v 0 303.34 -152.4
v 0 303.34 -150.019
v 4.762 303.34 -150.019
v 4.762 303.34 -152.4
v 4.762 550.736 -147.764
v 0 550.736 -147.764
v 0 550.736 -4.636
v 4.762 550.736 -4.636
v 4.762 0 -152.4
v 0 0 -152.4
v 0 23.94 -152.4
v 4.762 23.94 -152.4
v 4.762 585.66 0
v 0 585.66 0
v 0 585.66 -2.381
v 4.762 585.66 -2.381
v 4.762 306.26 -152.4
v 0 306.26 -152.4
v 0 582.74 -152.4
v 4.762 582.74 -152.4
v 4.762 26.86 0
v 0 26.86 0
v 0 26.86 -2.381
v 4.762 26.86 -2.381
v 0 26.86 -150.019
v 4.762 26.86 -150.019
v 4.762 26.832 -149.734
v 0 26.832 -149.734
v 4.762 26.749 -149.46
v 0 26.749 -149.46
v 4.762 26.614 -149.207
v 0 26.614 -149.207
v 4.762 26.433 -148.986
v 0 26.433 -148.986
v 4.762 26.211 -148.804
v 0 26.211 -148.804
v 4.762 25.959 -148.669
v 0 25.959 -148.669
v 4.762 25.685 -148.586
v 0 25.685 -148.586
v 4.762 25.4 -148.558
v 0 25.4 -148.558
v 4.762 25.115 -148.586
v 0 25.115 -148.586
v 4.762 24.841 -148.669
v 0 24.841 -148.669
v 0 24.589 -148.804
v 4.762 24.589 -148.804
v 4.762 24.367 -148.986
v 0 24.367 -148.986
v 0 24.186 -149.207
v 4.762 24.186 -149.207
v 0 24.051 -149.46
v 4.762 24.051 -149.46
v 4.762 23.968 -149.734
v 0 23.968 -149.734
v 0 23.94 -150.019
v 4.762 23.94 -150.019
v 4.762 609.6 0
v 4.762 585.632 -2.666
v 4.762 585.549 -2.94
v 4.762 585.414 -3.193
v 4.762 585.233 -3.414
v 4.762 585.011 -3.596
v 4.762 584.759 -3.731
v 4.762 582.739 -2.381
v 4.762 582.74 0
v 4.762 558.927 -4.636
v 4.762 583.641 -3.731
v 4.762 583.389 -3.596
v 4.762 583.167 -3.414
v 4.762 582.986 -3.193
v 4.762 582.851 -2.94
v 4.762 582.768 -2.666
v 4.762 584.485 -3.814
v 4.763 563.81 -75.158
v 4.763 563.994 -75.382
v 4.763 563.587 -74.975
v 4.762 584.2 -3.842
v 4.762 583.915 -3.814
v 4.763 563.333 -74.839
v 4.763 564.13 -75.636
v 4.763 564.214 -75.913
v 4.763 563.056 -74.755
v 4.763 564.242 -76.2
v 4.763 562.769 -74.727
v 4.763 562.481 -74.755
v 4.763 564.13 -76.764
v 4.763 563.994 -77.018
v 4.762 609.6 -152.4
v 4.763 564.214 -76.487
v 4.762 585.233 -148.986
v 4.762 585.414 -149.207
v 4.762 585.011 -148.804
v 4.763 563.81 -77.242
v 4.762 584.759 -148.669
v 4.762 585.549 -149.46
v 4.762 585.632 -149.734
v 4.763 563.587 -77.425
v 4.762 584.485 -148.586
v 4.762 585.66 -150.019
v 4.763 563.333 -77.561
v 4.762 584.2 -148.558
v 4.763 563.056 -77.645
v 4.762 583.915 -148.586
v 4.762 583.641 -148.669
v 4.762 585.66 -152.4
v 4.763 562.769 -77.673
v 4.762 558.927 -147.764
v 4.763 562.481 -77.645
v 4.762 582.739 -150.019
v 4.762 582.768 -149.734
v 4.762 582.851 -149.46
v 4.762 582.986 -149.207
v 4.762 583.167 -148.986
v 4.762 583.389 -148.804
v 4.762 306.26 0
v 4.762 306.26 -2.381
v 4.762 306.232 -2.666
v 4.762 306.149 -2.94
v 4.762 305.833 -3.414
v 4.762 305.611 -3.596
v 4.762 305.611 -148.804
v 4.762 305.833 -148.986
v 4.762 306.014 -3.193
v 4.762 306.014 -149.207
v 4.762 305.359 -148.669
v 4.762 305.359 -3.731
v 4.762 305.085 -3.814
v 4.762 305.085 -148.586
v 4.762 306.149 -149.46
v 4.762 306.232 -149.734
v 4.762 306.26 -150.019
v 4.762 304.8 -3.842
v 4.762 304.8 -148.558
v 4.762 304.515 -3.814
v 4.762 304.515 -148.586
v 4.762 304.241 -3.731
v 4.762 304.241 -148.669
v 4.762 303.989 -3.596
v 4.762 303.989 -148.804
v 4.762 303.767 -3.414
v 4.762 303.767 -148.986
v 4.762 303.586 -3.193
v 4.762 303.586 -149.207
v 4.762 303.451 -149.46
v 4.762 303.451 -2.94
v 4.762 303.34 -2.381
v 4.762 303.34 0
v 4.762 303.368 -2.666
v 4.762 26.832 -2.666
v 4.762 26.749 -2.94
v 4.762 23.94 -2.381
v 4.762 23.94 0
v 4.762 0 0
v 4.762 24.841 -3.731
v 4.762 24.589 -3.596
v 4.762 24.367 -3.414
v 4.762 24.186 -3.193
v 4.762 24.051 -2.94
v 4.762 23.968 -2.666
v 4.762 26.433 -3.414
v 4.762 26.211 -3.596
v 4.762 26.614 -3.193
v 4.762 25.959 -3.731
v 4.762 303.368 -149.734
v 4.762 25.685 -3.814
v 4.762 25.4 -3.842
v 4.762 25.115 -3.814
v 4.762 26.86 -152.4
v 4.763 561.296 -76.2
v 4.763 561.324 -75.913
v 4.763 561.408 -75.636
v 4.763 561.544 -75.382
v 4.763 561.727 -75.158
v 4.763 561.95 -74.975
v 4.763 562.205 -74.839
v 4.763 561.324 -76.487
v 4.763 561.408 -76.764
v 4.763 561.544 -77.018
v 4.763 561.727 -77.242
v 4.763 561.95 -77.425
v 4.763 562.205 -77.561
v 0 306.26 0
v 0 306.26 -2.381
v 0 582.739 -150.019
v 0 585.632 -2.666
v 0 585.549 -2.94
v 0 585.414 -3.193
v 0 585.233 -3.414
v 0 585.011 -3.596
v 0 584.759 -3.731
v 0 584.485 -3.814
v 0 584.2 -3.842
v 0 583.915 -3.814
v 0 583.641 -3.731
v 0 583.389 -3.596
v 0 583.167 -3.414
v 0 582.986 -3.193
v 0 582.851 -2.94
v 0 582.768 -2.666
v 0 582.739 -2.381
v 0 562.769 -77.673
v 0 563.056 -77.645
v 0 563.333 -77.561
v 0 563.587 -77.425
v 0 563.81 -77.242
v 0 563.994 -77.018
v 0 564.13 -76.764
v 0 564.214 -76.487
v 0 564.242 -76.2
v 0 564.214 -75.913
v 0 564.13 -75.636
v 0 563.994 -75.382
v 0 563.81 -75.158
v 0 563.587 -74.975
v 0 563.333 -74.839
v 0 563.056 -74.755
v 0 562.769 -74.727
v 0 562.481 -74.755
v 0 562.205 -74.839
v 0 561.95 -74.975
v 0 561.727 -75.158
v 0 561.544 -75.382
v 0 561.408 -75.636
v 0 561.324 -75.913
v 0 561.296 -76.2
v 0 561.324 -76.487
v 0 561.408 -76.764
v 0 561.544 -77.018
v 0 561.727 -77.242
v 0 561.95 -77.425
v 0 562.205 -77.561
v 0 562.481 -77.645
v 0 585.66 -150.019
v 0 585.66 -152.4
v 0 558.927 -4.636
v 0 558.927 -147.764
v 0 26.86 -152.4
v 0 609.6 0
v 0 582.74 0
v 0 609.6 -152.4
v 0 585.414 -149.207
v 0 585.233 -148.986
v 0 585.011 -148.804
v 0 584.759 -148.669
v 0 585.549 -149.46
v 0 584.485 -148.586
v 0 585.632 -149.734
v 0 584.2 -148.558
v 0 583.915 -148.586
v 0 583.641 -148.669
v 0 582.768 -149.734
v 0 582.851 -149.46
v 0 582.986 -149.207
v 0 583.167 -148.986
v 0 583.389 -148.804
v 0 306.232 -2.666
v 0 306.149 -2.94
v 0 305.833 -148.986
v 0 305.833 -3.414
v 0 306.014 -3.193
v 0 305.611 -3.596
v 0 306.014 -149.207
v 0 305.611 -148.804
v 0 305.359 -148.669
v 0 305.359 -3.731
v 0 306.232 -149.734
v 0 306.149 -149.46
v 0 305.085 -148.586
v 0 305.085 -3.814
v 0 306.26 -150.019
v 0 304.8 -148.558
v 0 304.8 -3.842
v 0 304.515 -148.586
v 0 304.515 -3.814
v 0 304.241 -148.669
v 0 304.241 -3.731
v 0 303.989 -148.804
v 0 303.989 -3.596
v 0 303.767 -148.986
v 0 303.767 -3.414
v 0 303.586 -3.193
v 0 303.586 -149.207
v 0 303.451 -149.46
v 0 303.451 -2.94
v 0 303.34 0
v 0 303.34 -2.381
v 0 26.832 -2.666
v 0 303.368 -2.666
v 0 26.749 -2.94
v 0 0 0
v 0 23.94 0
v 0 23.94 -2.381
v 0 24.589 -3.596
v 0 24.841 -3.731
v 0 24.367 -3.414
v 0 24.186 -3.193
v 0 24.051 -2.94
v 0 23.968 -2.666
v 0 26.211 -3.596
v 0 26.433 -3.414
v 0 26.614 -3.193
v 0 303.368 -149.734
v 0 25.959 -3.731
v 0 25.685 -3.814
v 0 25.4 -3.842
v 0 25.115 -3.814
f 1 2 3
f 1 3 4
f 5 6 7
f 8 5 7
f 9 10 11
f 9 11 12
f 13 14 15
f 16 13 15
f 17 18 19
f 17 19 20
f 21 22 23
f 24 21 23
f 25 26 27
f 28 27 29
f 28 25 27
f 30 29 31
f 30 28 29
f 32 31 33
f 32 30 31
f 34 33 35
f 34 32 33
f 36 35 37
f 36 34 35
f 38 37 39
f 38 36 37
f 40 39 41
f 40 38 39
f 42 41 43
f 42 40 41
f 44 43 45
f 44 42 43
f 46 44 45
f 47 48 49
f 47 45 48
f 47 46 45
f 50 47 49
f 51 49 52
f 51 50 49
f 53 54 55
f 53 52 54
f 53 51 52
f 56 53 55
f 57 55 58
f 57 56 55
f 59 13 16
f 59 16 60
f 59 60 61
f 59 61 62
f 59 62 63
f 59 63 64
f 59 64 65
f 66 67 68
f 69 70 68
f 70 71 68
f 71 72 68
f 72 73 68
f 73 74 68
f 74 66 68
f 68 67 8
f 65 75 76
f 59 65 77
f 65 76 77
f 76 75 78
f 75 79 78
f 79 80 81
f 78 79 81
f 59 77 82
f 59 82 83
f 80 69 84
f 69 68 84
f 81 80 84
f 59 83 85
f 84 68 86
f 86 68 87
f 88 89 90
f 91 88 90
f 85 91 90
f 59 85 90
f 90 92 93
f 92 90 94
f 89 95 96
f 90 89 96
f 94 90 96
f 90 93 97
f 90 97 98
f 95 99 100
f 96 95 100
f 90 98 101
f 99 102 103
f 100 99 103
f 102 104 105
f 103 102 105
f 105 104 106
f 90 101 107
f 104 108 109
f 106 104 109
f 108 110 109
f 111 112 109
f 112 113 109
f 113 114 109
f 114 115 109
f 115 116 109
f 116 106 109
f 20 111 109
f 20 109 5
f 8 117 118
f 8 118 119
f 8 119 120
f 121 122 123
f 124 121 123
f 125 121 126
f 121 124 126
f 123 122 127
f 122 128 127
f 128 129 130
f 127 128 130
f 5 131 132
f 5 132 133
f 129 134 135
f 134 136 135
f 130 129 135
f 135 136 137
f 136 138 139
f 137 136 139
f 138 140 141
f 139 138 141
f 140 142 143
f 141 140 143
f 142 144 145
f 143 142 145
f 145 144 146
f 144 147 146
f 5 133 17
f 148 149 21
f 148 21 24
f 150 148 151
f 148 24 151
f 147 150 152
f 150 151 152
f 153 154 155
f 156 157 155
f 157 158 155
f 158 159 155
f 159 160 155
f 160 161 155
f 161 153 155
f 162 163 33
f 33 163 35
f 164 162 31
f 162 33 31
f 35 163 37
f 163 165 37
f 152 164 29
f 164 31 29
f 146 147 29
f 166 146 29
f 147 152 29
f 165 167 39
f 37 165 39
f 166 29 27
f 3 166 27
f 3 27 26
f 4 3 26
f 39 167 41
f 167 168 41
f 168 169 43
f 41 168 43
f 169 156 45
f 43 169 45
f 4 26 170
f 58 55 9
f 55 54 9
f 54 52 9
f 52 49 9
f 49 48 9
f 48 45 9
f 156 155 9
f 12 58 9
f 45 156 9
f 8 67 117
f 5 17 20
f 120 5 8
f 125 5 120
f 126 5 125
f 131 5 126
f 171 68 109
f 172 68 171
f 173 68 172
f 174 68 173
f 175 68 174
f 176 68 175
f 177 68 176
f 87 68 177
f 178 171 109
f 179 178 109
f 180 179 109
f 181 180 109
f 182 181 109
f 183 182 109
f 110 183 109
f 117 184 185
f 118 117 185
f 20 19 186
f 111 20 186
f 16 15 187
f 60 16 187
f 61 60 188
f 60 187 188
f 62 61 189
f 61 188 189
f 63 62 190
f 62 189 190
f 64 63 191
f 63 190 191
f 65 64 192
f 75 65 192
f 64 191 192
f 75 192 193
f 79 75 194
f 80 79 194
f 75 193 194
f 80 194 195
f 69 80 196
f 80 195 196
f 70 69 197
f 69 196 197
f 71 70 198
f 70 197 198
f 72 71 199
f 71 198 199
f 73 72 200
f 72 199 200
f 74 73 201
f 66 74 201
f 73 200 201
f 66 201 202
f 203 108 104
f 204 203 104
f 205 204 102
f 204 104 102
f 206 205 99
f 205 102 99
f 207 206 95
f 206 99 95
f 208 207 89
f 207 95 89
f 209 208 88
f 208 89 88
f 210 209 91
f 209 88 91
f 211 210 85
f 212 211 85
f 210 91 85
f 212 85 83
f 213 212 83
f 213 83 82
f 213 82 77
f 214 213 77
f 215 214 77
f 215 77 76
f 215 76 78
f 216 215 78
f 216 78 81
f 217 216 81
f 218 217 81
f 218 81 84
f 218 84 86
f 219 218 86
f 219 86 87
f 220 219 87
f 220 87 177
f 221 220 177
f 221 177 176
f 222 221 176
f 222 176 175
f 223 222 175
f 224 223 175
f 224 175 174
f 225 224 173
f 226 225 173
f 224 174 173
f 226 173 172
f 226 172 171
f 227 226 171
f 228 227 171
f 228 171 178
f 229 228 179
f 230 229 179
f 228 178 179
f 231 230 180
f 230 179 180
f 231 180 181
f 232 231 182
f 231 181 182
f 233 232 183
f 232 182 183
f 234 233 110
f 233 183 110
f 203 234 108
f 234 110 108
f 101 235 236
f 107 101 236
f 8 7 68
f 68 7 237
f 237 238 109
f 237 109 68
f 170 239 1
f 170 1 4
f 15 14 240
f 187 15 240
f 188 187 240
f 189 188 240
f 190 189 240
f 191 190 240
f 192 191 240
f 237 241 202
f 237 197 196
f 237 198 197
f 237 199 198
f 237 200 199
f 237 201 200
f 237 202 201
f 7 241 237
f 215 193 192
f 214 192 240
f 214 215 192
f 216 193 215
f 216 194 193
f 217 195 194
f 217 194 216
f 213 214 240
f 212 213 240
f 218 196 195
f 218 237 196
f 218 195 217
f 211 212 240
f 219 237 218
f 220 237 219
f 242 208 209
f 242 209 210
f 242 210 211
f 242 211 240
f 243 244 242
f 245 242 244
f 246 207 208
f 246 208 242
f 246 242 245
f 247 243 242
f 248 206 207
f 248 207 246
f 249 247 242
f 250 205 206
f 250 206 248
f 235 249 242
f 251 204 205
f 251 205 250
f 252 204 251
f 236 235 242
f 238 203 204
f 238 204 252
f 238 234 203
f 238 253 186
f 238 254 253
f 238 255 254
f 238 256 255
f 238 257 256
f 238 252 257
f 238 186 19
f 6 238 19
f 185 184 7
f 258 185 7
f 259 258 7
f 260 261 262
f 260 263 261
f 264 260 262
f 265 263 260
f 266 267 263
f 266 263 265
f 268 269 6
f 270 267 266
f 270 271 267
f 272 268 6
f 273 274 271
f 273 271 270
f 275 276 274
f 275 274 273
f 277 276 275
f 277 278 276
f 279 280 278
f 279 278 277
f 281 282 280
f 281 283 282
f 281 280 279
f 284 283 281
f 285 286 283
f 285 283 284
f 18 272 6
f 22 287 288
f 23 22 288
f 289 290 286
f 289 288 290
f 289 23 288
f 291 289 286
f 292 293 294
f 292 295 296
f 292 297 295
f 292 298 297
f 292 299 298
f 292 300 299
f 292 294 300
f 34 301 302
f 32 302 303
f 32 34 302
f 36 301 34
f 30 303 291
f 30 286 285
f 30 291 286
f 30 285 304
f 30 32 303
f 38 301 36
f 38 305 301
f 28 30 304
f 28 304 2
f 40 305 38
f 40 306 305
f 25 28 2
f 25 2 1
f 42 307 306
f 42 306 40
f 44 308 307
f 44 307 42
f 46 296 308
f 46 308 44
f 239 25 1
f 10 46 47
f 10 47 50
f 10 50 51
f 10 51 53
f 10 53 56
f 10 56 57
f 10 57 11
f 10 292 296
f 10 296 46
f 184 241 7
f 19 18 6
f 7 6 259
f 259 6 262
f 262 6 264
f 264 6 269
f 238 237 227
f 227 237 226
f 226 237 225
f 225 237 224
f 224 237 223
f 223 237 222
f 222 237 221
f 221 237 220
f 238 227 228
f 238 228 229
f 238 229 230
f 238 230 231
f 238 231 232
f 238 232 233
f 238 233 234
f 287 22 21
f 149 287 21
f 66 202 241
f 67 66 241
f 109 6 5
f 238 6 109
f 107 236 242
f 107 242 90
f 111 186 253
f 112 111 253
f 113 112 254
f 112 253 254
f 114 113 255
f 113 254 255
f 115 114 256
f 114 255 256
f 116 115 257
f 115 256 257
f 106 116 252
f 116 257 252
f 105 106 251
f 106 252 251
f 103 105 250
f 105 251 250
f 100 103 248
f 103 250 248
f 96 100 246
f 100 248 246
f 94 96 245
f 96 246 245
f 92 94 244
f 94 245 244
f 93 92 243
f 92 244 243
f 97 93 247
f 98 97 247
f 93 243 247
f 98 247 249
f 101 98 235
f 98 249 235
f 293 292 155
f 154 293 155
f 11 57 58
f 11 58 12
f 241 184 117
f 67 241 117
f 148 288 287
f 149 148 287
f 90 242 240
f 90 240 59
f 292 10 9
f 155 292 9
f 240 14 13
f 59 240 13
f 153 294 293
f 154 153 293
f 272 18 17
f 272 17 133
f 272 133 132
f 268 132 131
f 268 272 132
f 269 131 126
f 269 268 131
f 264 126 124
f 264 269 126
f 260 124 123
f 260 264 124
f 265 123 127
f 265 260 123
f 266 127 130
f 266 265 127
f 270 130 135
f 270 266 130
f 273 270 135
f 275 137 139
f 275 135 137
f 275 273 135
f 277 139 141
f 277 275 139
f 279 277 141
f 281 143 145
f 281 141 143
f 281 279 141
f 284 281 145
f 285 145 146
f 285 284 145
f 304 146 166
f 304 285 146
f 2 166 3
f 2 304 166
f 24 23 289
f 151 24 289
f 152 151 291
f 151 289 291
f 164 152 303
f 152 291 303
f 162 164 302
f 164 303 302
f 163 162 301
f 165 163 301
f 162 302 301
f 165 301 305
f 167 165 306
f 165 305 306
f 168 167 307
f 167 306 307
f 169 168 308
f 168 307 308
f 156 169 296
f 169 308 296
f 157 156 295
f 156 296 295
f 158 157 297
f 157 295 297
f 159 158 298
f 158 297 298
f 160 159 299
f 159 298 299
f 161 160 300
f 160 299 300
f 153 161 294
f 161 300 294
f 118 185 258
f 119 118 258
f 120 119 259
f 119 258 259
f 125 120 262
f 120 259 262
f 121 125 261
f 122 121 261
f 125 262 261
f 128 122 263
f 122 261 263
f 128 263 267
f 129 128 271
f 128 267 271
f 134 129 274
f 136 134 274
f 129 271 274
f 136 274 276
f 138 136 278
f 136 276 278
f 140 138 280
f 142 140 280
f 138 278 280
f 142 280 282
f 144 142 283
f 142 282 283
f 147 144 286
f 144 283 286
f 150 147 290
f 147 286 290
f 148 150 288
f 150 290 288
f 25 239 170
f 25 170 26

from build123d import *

# Parameters (mm, degrees)
SKETCH1_W             = 4.7625
SKETCH1_H             = 152.4
BOSS_EXTRUDE1_DEPTH   = 609.6
SKETCH2_W             = 142.875
SKETCH2_H             = 7.9375
CUT_EXTRUDE1_DEPTH    = 629.379345146
CUT_EXTRUDE2_DEPTH    = 629.379345146
F_4_CLEARANCE_HOLE1_D = 2.9464
SKETCH6_W             = 143.129
SKETCH6_H             = 8.1915
SKETCH6_W_2           = 142.875
SKETCH6_H_2           = 7.9375
CUT_EXTRUDE3_DEPTH    = 629.379345146


with BuildPart() as part:
    # Sketch1 → Boss-Extrude1 (new body)
    with BuildSketch(Plane(origin=(0, 0, 0), x_dir=(1, 0, 0), z_dir=(0, 1, 0))):
        with Locations((2.38125, 76.2)):
            Rectangle(SKETCH1_W, SKETCH1_H)
    extrude(amount=BOSS_EXTRUDE1_DEPTH)

    # Sketch2 → Cut-Extrude1 (cut, through all)
    with BuildSketch(Plane(origin=(4.7625, 0, 0), x_dir=(0, 0, -1), z_dir=(1, 0, 0))):
        with Locations((76.2, 554.83125)):
            Rectangle(SKETCH2_W, SKETCH2_H)
    extrude(amount=-CUT_EXTRUDE1_DEPTH, mode=Mode.SUBTRACT)

    # Sketch3 → Cut-Extrude2 (cut, through all)
    with BuildSketch(Plane.ZY):
        with BuildLine():
            Line((-2.38125, 582.7395), (0, 582.7395))
            Line((0, 582.7395), (0, 585.6605))
            Line((0, 585.6605), (-2.38125, 585.6605))
            ThreePointArc((-2.38125, 585.6605), (-3.84175, 584.2), (-2.38125, 582.7395))
        make_face()
        with BuildLine():
            Line((-150.01875, 585.6605), (-152.4, 585.6605))
            Line((-152.4, 585.6605), (-152.4, 582.7395))
            Line((-152.4, 582.7395), (-150.01875, 582.7395))
            ThreePointArc((-150.01875, 582.7395), (-148.55825, 584.2), (-150.01875, 585.6605))
        make_face()
        with BuildLine():
            Line((-150.01875, 303.3395), (-152.4, 303.3395))
            Line((-152.4, 303.3395), (-152.4, 306.2605))
            Line((-152.4, 306.2605), (-150.01875, 306.2605))
            ThreePointArc((-150.01875, 306.2605), (-148.55825, 304.8), (-150.01875, 303.3395))
        make_face()
        with BuildLine():
            Line((-2.38125, 303.3395), (0, 303.3395))
            Line((0, 303.3395), (0, 306.2605))
            Line((0, 306.2605), (-2.38125, 306.2605))
            ThreePointArc((-2.38125, 306.2605), (-3.84175, 304.8), (-2.38125, 303.3395))
        make_face()
        with BuildLine():
            Line((-2.38125, 23.9395), (0, 23.9395))
            Line((0, 23.9395), (0, 26.8605))
            Line((0, 26.8605), (-2.38125, 26.8605))
            ThreePointArc((-2.38125, 26.8605), (-3.84175, 25.4), (-2.38125, 23.9395))
        make_face()
        with BuildLine():
            Line((-150.01875, 23.9395), (-152.4, 23.9395))
            Line((-152.4, 23.9395), (-152.4, 26.8605))
            Line((-152.4, 26.8605), (-150.01875, 26.8605))
            ThreePointArc((-150.01875, 26.8605), (-148.55825, 25.4), (-150.01875, 23.9395))
        make_face()
    extrude(amount=-CUT_EXTRUDE2_DEPTH, mode=Mode.SUBTRACT)

    # #4 Clearance Hole1 (through all)
    with Locations(Plane.ZY):
        with Locations((-76.2, 562.76875)):
            Hole(F_4_CLEARANCE_HOLE1_D / 2)

    # Sketch6 → Cut-Extrude3 (cut, through all)
    with BuildSketch(Plane.ZY):
        with Locations((-76.2, 554.83125)):
            Rectangle(SKETCH6_W, SKETCH6_H)
        with Locations((-76.2, 554.83125)):
            Rectangle(SKETCH6_W_2, SKETCH6_H_2, mode=Mode.SUBTRACT)
    extrude(amount=-CUT_EXTRUDE3_DEPTH, mode=Mode.SUBTRACT)


solid = part.part
